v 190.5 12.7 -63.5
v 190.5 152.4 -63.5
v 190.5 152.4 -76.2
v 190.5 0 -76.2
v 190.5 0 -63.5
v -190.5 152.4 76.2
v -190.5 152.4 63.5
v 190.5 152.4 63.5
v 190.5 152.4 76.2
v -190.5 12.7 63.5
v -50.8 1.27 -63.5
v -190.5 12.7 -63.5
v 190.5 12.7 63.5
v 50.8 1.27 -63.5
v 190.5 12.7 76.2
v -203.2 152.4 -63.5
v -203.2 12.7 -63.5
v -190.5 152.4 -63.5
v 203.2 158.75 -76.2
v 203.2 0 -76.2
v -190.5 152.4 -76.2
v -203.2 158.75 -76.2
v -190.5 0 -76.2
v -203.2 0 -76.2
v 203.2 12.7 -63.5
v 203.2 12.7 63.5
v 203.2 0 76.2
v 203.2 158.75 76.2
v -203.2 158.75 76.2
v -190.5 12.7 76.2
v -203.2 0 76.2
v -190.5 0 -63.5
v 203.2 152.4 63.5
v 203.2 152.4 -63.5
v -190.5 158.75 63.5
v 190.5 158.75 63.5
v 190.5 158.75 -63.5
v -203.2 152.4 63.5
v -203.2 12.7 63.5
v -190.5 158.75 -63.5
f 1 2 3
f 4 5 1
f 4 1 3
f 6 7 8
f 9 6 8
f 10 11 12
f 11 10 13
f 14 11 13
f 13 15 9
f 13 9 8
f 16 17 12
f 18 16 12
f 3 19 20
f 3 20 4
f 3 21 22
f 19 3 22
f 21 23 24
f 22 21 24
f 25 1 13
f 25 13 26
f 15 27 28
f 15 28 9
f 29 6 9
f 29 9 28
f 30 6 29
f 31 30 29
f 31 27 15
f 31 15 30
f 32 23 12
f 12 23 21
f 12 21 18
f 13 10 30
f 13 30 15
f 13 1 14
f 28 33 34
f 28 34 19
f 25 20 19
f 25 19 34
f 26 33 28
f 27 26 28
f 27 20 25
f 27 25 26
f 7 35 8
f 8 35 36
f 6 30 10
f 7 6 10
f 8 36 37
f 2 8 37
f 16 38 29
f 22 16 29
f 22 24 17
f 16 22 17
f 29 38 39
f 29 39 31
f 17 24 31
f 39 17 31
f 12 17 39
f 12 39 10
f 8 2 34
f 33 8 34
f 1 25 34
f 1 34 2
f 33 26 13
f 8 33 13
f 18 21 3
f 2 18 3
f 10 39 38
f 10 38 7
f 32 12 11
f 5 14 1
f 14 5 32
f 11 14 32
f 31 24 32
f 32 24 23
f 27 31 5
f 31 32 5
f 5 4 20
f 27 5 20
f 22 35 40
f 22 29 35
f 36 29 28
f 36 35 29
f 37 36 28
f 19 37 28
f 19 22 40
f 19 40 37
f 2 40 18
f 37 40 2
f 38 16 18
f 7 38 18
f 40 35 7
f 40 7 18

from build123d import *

# Parameters (mm, degrees)
SKETCH1_W                                  = 406.4
SKETCH1_H                                  = 152.4
SKETCH1_W_2                                = 381
SKETCH1_H_2                                = 127
BOSS_EXTRUDE1_DEPTH                        = 12.7
SKETCH2_W                                  = 12.7
SKETCH2_H                                  = 12.7
BOSS_EXTRUDE2_DEPTH                        = 146.05
MIRROR1_AT_THE_SECOND_PLANE_COPY_1_SKETC_W = 12.7
MIRROR1_AT_THE_SECOND_PLANE_COPY_1_SKETC_H = 12.7
MIRROR1_AT_THE_SECOND_PLANE_COPY_1_DEPTH   = 146.05
SKETCH3_W                                  = 406.4
SKETCH3_H                                  = 152.4
SKETCH3_W_2                                = 381
SKETCH3_H_2                                = 127
BOSS_EXTRUDE3_DEPTH                        = 6.35
SKETCH6_W                                  = 12.7
SKETCH6_H                                  = 12.7
CUT_EXTRUDE1_DEPTH                         = 381
BOSS_EXTRUDE5_DEPTH                        = 381
CUT_EXTRUDE3_DEPTH                         = 262.586090035
LOFT2_START                                = -63.5
LOFT2_DEPTH                                = 127
LOFT3_START                                = -63.5
LOFT3_DEPTH                                = 127


# Read off the part's stored shape, not the designer's step: Loft2, Loft3
with BuildPart() as part:
    # Sketch1 → Boss-Extrude1 (new body)
    with BuildSketch(Plane(origin=(0, 0, 0), x_dir=(1, 0, 0), z_dir=(0, 1, 0))):
        Rectangle(SKETCH1_W, SKETCH1_H)
        Rectangle(SKETCH1_W_2, SKETCH1_H_2, mode=Mode.SUBTRACT)
    extrude(amount=BOSS_EXTRUDE1_DEPTH)

    # Sketch2 → Boss-Extrude2 (add)
    with BuildSketch(Plane(origin=(0, 12.7, 0), x_dir=(1, 0, 0), z_dir=(0, 1, 0))):
        with Locations((-196.85, -69.85)):
            Rectangle(SKETCH2_W, SKETCH2_H)
    boss_extrude2 = extrude(amount=BOSS_EXTRUDE2_DEPTH)

    # Mirror1: Boss-Extrude2 across plane
    add(boss_extrude2.mirror(Plane(origin=(0, 0, 0), x_dir=(0, 0, 1), z_dir=(1, 0, 0))))

    # Mirror1 at the second plane: Boss-Extrude2 across plane
    add(boss_extrude2.mirror(Plane.XY))

    # Mirror1 at the second plane copy 1 sketc → Mirror1 at the second plane copy 1 (add)
    with BuildSketch(Plane(origin=(0, 12.7, 0), x_dir=(-1, 0, 0), z_dir=(0, 1, 0))):
        with Locations((-196.85, -69.85)):
            Rectangle(MIRROR1_AT_THE_SECOND_PLANE_COPY_1_SKETC_W, MIRROR1_AT_THE_SECOND_PLANE_COPY_1_SKETC_H)
    extrude(amount=MIRROR1_AT_THE_SECOND_PLANE_COPY_1_DEPTH)

    # Sketch3 → Boss-Extrude3 (add)
    with BuildSketch(Plane(origin=(0, 158.75, 0), x_dir=(1, 0, 0), z_dir=(0, 1, 0))):
        Rectangle(SKETCH3_W, SKETCH3_H)
        Rectangle(SKETCH3_W_2, SKETCH3_H_2, mode=Mode.SUBTRACT)
    extrude(amount=-BOSS_EXTRUDE3_DEPTH)

    # Sketch6 → Cut-Extrude1 (cut)
    with BuildSketch(Plane.ZY.offset(-190.5)):
        with Locations((-69.85, 6.35)):
            Rectangle(SKETCH6_W, SKETCH6_H)
    extrude(amount=CUT_EXTRUDE1_DEPTH, mode=Mode.SUBTRACT)

    # Sketch4 → Boss-Extrude5 (add)
    with BuildSketch(Plane.ZY.offset(-190.5)):
        Polygon((-63.5, 0), (63.5, 0), (63.5, 12.7), (-63.5, 1.27), align=None)
    extrude(amount=BOSS_EXTRUDE5_DEPTH)

    # Sketch10 → Cut-Extrude3 (cut, through all)
    with BuildSketch(Plane(origin=(0, 12.7, 0), x_dir=(1, 0, 0), z_dir=(0, 1, 0))):
        Polygon((-190.5, -63.5), (-190.5, 63.5), (-50.8, 63.5), align=None)
        Polygon((190.5, -63.5), (190.5, 63.5), (50.8, 63.5), align=None)
    extrude(amount=-CUT_EXTRUDE3_DEPTH, mode=Mode.SUBTRACT)

    # Loft2 outline → Loft2 (add)
    with BuildSketch(Plane.XY.offset(LOFT2_START)):
        Polygon((49, 1.122727273), (49, 0), (190.5, 0), (190.5, 12.7), (50.8, 1.27), align=None)
    extrude(amount=LOFT2_DEPTH)

    # Loft3 outline → Loft3 (add)
    with BuildSketch(Plane.XY.offset(LOFT3_START)):
        Polygon((-190.5, 12.7), (-190.5, 0), (-49, 0), (-49, 1.122727273), (-50.8, 1.27), align=None)
    extrude(amount=LOFT3_DEPTH)


solid = part.part
